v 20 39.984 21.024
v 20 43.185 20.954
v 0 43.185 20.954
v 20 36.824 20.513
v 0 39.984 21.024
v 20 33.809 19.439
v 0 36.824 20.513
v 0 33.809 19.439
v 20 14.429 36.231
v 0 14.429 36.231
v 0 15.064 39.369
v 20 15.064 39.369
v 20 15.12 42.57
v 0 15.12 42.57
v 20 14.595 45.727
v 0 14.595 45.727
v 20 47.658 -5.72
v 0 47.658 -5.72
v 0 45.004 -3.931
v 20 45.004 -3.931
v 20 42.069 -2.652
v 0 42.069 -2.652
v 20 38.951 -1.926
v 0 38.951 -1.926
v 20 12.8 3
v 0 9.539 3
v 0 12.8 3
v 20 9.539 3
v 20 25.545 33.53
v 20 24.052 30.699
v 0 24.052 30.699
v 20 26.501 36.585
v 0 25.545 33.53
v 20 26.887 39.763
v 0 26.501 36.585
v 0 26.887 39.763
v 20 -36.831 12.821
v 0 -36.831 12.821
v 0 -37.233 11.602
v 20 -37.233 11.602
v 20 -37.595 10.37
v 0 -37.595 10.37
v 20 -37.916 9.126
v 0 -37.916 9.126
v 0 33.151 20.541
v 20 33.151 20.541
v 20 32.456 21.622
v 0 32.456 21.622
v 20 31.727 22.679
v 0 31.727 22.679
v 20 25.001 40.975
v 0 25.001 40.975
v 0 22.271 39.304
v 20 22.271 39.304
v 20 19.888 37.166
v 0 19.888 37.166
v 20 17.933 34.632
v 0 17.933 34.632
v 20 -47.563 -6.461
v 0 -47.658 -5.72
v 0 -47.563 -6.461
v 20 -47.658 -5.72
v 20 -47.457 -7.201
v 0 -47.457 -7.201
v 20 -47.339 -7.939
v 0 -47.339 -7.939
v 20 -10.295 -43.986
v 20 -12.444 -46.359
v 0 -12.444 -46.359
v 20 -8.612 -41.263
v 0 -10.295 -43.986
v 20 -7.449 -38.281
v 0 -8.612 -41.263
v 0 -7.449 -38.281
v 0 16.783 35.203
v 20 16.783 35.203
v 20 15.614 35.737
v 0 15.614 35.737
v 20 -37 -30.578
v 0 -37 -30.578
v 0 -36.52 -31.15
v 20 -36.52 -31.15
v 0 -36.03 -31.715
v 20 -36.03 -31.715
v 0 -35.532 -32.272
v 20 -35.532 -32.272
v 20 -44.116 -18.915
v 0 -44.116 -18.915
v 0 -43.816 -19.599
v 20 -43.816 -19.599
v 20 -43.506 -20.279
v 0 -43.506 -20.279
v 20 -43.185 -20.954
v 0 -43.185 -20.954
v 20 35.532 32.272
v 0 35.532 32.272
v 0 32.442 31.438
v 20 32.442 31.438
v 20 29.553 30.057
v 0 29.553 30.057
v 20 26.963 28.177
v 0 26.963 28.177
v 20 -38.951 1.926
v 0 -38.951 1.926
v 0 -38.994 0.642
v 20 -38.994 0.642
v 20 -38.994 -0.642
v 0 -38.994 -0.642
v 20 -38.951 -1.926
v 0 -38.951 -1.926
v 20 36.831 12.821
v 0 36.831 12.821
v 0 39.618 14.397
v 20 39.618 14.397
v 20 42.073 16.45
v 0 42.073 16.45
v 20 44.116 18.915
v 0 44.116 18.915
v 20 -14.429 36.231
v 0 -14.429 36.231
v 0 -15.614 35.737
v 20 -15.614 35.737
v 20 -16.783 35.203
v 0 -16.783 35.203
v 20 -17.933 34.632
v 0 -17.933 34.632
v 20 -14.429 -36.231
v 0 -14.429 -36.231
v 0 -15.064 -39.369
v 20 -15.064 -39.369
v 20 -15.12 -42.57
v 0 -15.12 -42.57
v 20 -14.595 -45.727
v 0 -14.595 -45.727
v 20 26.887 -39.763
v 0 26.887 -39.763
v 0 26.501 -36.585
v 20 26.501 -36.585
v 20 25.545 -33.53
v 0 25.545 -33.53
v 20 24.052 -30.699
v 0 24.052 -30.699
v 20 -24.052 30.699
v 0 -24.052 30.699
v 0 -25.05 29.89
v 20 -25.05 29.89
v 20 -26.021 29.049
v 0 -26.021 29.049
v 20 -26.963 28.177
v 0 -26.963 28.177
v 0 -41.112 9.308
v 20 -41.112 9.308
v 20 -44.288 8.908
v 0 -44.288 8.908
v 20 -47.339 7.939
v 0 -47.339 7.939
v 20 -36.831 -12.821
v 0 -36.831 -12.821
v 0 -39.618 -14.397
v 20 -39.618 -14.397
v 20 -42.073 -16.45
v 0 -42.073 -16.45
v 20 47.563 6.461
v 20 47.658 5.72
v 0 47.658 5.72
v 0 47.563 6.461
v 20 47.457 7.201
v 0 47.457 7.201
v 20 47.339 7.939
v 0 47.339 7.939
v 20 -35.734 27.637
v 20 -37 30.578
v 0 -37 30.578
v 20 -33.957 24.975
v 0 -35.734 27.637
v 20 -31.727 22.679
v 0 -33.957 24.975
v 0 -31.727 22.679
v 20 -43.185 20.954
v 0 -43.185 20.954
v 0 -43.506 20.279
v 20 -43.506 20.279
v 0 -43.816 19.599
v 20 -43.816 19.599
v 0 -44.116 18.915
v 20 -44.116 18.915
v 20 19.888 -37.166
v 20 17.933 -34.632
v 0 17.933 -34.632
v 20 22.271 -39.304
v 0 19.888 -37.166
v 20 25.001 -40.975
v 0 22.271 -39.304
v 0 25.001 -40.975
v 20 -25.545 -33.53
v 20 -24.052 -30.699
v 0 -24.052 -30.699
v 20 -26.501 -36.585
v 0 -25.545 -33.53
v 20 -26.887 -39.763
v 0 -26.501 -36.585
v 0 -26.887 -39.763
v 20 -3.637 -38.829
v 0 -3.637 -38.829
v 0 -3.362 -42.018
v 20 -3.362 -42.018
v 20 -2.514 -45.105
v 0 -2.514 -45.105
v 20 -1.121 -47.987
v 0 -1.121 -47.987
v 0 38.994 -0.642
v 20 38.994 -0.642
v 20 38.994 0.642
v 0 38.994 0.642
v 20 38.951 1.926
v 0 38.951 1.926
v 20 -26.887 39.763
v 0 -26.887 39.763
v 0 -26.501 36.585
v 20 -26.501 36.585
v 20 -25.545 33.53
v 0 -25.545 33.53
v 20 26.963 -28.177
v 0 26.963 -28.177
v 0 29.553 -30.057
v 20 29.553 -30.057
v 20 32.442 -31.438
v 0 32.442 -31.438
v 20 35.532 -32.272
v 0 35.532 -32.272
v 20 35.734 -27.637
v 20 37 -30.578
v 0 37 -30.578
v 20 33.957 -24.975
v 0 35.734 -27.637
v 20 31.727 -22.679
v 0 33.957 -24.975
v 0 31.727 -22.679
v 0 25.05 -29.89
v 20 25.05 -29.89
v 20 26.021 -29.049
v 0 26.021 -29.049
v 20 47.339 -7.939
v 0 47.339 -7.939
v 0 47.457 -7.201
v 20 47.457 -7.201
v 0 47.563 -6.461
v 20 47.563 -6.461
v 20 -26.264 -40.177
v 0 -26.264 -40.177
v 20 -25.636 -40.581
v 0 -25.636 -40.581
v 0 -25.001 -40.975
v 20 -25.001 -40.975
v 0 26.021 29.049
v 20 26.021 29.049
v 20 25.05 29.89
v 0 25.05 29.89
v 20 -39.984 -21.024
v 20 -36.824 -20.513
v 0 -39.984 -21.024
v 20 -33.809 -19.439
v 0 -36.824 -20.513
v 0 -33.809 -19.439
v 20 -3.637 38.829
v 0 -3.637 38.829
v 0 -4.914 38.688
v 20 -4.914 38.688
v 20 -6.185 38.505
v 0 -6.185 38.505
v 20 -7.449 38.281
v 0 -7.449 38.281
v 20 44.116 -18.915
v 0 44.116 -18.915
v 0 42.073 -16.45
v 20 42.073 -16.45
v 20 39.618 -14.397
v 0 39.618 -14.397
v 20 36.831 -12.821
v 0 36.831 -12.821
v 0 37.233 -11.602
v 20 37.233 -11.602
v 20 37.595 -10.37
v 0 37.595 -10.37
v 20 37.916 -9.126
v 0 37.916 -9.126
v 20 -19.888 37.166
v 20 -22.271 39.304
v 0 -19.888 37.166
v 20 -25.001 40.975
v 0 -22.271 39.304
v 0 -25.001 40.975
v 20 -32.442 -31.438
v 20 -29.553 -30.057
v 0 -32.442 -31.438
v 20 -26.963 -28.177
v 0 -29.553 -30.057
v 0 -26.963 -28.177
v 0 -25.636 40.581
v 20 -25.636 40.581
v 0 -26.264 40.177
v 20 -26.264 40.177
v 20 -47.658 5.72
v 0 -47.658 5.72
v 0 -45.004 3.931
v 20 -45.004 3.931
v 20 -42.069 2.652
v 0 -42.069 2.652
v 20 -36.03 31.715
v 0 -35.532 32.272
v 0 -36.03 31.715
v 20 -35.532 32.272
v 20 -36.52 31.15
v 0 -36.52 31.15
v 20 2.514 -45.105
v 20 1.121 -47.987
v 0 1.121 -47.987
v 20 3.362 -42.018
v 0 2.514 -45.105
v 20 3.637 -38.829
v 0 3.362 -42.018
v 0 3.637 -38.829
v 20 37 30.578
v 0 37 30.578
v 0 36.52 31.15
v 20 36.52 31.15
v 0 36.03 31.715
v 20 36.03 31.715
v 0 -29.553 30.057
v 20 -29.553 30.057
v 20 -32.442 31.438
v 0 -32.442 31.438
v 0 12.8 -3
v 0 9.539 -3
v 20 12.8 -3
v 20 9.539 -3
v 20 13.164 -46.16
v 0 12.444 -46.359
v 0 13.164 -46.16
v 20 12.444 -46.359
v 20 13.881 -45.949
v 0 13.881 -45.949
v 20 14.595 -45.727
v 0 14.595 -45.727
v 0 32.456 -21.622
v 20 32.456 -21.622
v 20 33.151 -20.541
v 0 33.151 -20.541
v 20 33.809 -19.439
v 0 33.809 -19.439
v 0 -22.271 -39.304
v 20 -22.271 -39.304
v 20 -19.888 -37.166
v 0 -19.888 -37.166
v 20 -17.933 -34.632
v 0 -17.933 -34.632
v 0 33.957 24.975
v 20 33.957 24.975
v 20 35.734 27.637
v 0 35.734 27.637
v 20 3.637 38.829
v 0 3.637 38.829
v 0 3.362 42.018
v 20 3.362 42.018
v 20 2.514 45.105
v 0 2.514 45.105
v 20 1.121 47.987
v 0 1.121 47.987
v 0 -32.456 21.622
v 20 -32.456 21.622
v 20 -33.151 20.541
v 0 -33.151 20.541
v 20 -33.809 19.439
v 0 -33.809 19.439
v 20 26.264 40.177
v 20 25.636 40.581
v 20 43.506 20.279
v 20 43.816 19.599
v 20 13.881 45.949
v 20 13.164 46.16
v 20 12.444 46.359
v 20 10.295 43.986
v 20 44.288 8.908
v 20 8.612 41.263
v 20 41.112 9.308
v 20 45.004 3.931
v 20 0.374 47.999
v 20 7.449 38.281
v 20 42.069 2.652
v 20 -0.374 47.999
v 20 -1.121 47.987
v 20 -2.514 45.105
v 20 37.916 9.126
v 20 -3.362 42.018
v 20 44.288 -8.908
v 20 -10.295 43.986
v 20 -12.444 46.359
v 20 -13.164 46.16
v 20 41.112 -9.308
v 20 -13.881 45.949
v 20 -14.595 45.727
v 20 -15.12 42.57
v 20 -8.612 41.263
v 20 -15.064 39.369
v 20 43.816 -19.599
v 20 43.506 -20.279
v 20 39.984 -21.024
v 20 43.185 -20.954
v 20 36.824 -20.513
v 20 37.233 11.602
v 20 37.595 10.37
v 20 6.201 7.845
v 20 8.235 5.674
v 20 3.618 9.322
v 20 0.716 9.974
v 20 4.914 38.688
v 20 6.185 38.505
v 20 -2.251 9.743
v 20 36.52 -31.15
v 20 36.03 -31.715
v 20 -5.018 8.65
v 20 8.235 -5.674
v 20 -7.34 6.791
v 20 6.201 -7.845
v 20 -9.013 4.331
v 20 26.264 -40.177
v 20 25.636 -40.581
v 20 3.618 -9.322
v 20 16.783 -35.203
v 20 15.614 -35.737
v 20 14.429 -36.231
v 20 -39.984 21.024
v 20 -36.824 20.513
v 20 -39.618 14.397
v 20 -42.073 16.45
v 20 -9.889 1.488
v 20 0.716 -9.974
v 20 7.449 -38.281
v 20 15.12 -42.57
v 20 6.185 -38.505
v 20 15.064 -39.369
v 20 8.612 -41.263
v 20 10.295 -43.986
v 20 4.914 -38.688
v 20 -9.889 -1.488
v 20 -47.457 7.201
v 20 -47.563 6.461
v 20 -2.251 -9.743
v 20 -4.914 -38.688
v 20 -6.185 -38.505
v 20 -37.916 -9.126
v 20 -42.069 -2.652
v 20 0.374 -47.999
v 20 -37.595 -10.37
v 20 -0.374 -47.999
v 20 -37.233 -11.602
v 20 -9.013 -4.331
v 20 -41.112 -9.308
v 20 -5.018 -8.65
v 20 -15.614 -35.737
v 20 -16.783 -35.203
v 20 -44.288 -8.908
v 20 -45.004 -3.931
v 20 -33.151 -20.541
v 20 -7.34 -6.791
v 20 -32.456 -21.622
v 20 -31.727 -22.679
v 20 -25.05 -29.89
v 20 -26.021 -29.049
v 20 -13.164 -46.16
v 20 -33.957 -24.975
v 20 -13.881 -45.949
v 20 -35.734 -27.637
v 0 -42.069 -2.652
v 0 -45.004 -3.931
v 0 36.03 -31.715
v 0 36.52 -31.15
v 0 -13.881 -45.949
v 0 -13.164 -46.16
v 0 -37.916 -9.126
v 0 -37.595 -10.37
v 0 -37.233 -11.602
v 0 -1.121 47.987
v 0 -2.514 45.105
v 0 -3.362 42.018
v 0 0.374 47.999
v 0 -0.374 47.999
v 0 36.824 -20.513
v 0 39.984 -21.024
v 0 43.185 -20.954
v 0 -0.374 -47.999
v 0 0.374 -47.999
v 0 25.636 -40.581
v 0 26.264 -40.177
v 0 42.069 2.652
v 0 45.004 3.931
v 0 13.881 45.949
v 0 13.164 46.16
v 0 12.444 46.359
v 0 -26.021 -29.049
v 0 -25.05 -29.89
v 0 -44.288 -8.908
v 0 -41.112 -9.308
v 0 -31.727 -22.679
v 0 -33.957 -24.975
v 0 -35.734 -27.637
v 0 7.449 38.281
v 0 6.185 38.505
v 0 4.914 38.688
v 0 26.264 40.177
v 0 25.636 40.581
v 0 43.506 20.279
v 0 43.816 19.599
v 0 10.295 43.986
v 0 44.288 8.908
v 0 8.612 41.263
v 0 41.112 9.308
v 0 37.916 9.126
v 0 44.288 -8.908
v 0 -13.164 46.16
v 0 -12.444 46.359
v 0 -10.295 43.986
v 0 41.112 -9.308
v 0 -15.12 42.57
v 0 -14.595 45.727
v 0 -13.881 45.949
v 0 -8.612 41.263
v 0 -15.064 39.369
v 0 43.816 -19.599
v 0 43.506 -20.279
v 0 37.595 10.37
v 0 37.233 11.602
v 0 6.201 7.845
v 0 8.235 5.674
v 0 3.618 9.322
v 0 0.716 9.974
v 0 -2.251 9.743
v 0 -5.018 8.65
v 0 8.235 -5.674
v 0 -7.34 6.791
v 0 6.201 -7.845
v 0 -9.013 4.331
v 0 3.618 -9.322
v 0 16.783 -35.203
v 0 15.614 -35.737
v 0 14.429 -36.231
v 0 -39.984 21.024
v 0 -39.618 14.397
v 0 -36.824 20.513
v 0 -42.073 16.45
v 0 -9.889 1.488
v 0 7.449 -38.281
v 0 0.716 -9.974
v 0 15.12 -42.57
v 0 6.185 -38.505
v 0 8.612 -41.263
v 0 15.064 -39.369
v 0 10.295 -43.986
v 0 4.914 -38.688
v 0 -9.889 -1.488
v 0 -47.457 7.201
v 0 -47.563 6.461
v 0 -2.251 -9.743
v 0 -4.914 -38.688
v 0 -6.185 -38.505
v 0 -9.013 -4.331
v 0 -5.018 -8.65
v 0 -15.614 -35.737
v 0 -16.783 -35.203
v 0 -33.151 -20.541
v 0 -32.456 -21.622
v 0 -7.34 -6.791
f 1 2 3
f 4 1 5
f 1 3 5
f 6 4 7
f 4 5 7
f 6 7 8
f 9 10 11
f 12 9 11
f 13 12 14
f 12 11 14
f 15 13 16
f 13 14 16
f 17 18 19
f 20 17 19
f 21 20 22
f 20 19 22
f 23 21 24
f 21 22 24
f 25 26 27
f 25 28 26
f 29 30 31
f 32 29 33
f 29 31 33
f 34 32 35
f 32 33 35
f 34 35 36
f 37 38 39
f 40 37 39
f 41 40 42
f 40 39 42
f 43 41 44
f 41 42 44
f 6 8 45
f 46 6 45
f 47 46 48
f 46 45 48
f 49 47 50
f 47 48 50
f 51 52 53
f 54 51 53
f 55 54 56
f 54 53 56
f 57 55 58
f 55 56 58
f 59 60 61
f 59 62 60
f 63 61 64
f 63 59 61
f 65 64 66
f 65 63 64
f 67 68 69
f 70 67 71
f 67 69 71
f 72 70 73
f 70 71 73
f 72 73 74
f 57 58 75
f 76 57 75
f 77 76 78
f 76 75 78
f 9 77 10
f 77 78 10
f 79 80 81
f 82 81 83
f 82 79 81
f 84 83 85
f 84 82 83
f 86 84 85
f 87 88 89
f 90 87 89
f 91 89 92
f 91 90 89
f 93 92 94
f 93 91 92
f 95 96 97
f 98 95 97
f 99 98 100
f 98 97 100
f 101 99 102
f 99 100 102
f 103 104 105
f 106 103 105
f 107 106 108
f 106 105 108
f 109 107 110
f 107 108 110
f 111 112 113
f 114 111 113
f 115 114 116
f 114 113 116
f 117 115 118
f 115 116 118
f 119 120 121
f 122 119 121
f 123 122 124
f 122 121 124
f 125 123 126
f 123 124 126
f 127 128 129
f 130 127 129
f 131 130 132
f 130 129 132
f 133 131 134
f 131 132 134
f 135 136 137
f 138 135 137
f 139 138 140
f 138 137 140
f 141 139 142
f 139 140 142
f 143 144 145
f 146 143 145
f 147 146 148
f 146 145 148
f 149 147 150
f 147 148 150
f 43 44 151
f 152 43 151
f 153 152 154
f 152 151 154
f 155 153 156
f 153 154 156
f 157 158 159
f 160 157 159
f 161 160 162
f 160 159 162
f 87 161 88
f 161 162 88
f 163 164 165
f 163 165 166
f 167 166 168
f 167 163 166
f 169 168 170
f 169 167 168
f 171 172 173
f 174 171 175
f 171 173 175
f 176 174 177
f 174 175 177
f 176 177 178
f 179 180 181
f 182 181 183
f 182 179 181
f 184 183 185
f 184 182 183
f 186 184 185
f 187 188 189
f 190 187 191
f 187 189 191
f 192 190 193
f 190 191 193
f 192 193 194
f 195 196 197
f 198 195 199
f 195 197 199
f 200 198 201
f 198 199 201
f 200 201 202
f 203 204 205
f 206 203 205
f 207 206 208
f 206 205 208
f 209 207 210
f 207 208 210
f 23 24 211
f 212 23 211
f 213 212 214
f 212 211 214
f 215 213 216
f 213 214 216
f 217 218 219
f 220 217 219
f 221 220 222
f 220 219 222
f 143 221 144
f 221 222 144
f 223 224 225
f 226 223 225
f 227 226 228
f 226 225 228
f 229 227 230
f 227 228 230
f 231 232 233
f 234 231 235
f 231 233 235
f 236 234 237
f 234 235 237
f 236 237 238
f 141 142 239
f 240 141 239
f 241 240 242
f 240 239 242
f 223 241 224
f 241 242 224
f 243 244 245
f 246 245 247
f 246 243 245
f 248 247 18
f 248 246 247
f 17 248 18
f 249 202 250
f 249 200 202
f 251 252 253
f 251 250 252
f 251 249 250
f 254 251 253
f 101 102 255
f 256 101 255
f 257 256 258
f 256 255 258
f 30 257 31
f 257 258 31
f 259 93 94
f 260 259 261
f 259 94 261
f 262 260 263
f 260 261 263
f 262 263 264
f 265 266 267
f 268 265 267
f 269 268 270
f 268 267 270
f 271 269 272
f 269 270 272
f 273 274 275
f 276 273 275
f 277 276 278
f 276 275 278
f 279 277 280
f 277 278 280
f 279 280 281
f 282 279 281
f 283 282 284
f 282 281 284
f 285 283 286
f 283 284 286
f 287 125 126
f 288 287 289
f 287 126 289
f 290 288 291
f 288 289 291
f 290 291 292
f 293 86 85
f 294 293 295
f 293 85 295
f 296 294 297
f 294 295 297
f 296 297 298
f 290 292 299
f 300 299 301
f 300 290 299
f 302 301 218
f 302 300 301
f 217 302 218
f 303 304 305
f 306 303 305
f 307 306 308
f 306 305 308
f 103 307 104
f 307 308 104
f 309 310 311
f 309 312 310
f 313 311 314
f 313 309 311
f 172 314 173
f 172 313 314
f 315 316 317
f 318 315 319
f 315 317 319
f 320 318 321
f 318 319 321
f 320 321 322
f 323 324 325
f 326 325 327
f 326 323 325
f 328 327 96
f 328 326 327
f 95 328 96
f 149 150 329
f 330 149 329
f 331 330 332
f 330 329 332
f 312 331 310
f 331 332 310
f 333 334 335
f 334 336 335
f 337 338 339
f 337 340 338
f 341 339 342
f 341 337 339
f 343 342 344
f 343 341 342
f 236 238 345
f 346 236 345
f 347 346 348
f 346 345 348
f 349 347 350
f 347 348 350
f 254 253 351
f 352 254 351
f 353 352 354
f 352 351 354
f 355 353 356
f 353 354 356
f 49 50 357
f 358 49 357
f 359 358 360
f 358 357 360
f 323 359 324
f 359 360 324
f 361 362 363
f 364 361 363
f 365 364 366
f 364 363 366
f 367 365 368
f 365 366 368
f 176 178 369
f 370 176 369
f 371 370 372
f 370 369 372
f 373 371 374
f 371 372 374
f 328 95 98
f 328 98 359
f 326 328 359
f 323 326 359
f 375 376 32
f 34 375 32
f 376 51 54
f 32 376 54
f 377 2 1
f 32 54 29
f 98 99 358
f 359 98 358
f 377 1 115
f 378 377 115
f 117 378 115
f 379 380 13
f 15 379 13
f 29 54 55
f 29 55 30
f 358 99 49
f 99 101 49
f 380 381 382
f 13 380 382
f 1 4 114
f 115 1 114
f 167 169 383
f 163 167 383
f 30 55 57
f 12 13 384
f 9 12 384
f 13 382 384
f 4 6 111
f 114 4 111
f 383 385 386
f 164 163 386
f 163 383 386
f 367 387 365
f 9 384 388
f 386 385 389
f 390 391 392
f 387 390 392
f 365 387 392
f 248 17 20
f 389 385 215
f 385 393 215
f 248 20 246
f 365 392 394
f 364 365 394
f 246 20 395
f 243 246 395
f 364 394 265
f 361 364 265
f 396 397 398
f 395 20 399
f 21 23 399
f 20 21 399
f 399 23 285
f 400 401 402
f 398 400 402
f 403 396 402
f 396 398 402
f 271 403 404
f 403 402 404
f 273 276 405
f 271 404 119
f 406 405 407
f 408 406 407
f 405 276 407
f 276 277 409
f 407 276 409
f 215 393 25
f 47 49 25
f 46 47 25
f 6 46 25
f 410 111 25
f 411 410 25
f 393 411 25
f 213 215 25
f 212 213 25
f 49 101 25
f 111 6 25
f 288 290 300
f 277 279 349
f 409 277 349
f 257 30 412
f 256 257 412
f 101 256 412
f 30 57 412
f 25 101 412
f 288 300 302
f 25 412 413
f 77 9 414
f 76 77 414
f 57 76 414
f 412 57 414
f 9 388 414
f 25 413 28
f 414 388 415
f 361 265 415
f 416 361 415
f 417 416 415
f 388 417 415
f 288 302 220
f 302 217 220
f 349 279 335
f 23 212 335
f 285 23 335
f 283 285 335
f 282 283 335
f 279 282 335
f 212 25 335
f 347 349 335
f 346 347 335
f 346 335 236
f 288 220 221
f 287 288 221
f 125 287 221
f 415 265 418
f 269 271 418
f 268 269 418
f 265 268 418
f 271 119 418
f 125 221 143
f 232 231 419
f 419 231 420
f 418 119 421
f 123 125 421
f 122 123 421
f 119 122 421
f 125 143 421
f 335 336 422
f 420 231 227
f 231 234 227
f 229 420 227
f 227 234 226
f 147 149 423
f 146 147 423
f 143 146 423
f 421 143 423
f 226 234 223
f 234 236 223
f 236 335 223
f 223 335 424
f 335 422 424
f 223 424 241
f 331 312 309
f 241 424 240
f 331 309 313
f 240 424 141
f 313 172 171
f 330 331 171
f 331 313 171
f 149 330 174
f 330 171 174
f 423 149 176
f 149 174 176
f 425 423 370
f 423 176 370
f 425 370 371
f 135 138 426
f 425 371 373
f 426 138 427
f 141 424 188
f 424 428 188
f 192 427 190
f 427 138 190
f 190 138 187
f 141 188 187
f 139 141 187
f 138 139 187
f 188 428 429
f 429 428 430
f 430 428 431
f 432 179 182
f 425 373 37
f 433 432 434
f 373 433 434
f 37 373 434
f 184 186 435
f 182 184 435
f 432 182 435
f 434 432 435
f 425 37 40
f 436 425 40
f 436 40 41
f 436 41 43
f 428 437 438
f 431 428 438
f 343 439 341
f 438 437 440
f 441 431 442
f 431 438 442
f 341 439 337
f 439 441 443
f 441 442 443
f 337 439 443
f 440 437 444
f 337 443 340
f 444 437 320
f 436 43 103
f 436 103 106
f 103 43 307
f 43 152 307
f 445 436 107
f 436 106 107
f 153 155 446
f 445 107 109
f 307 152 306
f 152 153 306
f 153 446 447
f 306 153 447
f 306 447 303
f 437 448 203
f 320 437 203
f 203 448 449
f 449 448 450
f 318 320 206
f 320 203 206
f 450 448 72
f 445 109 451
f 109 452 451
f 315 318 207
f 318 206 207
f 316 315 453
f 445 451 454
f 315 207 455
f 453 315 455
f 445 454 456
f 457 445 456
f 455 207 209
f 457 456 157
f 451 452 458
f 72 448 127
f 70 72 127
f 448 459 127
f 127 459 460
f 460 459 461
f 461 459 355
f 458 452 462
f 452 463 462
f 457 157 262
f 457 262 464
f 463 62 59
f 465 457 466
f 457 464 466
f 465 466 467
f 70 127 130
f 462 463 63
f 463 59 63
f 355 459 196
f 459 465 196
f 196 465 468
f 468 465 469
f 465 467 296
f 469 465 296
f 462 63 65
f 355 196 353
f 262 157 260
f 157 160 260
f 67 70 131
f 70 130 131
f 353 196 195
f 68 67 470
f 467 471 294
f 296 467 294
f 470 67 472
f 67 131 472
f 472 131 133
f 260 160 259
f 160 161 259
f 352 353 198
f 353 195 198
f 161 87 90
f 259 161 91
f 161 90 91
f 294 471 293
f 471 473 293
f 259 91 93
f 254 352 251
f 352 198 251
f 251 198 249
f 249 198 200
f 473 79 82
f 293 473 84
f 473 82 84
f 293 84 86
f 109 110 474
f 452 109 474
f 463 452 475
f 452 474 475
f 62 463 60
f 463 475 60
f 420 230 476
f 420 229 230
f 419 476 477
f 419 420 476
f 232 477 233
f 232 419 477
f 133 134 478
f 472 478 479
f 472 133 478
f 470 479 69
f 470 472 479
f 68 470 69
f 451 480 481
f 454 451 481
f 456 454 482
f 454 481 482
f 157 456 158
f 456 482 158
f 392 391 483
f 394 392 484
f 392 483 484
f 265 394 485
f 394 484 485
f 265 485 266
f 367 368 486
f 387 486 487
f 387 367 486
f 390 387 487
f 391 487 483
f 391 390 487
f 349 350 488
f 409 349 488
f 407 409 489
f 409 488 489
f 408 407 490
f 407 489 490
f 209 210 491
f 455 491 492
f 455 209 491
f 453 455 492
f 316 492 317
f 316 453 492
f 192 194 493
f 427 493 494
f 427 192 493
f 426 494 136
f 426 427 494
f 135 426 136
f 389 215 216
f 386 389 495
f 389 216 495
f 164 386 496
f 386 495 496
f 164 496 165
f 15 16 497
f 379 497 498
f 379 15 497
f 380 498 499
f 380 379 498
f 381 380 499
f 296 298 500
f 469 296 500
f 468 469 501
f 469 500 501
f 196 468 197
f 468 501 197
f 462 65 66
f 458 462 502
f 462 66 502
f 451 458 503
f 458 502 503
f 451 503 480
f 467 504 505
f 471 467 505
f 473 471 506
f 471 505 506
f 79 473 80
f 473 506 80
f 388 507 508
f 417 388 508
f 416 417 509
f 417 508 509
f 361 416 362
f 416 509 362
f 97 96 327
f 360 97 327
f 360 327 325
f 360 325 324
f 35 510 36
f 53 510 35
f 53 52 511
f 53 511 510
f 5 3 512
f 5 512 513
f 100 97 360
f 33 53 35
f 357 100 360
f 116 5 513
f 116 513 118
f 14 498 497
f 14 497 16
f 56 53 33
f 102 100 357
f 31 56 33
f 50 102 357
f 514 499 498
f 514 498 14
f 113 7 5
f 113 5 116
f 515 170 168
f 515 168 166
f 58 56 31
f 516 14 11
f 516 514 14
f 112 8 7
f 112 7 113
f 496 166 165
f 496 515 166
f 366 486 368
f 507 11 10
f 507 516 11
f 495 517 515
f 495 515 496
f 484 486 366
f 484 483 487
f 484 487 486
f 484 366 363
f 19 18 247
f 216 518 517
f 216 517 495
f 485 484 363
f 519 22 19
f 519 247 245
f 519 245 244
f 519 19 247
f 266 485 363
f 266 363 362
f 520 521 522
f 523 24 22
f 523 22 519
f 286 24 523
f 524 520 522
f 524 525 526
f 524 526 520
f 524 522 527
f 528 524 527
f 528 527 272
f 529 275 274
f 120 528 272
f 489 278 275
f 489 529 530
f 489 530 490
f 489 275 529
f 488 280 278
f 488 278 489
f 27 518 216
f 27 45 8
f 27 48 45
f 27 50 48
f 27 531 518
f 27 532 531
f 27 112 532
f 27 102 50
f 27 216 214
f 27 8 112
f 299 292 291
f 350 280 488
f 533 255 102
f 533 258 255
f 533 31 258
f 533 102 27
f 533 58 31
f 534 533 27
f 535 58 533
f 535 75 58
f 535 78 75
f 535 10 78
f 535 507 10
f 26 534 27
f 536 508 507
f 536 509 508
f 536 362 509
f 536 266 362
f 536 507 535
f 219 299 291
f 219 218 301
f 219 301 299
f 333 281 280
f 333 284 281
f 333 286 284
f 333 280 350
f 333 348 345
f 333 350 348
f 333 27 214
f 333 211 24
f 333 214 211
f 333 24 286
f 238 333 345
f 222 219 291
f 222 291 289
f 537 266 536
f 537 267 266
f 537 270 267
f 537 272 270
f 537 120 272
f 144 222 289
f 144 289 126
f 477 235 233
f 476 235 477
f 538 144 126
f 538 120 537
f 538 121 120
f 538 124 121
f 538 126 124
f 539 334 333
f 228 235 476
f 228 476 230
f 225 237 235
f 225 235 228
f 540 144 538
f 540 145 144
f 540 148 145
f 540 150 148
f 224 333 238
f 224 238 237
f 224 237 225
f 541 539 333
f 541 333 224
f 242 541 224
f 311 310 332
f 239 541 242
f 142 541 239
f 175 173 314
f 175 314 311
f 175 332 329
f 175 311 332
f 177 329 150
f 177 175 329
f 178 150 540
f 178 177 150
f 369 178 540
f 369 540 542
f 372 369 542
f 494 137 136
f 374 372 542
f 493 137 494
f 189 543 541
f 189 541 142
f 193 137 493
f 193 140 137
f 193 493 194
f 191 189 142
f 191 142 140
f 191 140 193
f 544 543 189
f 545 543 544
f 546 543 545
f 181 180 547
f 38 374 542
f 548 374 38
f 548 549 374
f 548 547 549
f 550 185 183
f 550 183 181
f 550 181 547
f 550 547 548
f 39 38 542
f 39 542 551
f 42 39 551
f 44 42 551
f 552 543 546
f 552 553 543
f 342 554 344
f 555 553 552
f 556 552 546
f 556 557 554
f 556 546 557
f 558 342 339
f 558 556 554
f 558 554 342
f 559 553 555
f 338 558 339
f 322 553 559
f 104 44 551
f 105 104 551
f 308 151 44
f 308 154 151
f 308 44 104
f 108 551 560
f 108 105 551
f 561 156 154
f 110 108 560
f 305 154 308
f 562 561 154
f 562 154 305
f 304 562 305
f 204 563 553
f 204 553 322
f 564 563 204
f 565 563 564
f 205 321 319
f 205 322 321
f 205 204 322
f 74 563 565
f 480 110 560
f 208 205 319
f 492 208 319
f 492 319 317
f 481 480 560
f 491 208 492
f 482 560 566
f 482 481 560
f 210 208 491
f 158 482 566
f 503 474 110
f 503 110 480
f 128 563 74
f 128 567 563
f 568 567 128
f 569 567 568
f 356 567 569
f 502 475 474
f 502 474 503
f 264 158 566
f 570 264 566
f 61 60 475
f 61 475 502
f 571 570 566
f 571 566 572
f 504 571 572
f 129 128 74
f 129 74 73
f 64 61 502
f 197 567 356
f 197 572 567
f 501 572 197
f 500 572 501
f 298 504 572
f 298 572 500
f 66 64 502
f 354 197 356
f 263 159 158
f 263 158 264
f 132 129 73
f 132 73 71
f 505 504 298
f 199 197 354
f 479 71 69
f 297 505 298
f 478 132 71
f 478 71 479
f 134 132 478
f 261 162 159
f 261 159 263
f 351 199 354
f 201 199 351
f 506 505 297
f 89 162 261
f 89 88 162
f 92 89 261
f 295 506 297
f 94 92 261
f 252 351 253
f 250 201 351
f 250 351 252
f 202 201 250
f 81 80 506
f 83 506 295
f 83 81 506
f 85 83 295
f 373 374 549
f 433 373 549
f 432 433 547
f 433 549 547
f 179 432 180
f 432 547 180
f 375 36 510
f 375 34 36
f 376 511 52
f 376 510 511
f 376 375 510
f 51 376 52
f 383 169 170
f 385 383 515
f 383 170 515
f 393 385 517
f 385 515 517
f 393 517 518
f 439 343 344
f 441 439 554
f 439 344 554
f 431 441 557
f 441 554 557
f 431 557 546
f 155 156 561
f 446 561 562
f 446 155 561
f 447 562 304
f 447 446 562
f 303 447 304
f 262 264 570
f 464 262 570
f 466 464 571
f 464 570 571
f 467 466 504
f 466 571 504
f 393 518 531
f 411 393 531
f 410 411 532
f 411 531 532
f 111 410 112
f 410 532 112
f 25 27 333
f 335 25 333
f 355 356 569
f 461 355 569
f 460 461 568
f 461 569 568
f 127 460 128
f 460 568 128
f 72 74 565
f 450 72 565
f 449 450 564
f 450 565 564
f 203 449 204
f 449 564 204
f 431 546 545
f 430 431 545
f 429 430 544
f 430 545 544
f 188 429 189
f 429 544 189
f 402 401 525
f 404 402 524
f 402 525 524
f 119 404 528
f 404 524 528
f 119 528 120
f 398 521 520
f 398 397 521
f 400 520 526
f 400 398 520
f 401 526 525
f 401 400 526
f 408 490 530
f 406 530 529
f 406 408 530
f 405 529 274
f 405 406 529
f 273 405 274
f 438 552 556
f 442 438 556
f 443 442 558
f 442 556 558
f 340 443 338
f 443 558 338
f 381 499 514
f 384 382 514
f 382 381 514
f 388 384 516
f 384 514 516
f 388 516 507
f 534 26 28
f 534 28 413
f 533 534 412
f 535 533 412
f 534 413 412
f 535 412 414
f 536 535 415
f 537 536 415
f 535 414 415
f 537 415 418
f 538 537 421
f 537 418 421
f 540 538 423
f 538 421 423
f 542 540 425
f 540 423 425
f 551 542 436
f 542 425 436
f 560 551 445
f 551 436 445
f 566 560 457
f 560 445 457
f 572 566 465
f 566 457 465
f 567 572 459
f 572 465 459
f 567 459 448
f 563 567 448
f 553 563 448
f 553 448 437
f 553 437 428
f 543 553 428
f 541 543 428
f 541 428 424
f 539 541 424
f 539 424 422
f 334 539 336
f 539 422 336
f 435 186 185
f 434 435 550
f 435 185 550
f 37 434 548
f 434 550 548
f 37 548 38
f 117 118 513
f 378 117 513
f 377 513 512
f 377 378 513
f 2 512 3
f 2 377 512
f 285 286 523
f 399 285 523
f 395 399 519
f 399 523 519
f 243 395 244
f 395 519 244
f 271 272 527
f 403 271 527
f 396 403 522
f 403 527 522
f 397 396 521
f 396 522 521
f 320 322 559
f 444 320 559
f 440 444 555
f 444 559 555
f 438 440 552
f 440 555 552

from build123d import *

# Parameters (mm, degrees)
BASPROSKE_W     = 20
BASPROSKE_H     = 48
TOOTHCUT_DEPTH  = 71.767224052
TEETHCUTS_COUNT = 22
TEETHCUTS_ANGLE = 343.636363636
BORSKE_R        = 10
BORE_DEPTH      = 50.0000508
KEYSKE_W        = 6
KEYSKE_H        = 12.8
KEYWAY_DEPTH    = 50.0000508


with BuildPart() as part:
    # BasProSke → Base-Revolve (revolve)
    with BuildSketch(Plane(origin=(0, 0, 0), x_dir=(1, 0, 0), z_dir=(0, 1, 0)), mode=Mode.PRIVATE) as base_revolve_sk:
        with Locations((10, 24)):
            Rectangle(BASPROSKE_W, BASPROSKE_H)
    revolve(base_revolve_sk.sketch.rotate(Axis((-10, 0, 0), (1, 0, 0)), 180), axis=Axis((-10, 0, 0), (1, 0, 0)))

    # TooCutSke → ToothCut (cut, through all)
    with BuildSketch(Plane(origin=(0, 0, 0), x_dir=(0, 0, -1), z_dir=(1, 0, 0))):
        with BuildLine():
            ThreePointArc((1.925610671, 38.951431611), (0, 38.999), (-1.925610671, 38.951431611))
            ThreePointArc((-1.925610671, 38.951431611), (-3.230295596, 43.579258947), (-5.738738554, 47.681295337))
            ThreePointArc((-5.738738554, 47.681295337), (0, 48.0254), (5.738738554, 47.681295337))
            ThreePointArc((5.738738554, 47.681295337), (3.230295596, 43.579258947), (1.925610671, 38.951431611))
        make_face()
    toothcut = extrude(amount=TOOTHCUT_DEPTH, mode=Mode.SUBTRACT)

    # TeethCuts: ToothCut ×22 about axis
    teethcuts_axis = Axis((-10, 0, 0), (1, 0, 0))
    for i in range(1, TEETHCUTS_COUNT):
        add(toothcut.rotate(teethcuts_axis, i * TEETHCUTS_ANGLE / (TEETHCUTS_COUNT - 1)), mode=Mode.SUBTRACT)

    # BorSke → Bore (cut, symmetric)
    with BuildSketch(Plane(origin=(0, 0, 0), x_dir=(0, 0, -1), z_dir=(1, 0, 0))):
        with Locations(Location((0, 0, 0), (0, 0, 180))):
            Circle(BORSKE_R)
    extrude(amount=BORE_DEPTH, both=True, mode=Mode.SUBTRACT)

    # KeySke → Keyway (cut, symmetric)
    with BuildSketch(Plane(origin=(0, 0, 0), x_dir=(0, 0, -1), z_dir=(1, 0, 0))):
        with Locations((0, 6.4)):
            Rectangle(KEYSKE_W, KEYSKE_H)
    extrude(amount=KEYWAY_DEPTH, both=True, mode=Mode.SUBTRACT)


solid = part.part
